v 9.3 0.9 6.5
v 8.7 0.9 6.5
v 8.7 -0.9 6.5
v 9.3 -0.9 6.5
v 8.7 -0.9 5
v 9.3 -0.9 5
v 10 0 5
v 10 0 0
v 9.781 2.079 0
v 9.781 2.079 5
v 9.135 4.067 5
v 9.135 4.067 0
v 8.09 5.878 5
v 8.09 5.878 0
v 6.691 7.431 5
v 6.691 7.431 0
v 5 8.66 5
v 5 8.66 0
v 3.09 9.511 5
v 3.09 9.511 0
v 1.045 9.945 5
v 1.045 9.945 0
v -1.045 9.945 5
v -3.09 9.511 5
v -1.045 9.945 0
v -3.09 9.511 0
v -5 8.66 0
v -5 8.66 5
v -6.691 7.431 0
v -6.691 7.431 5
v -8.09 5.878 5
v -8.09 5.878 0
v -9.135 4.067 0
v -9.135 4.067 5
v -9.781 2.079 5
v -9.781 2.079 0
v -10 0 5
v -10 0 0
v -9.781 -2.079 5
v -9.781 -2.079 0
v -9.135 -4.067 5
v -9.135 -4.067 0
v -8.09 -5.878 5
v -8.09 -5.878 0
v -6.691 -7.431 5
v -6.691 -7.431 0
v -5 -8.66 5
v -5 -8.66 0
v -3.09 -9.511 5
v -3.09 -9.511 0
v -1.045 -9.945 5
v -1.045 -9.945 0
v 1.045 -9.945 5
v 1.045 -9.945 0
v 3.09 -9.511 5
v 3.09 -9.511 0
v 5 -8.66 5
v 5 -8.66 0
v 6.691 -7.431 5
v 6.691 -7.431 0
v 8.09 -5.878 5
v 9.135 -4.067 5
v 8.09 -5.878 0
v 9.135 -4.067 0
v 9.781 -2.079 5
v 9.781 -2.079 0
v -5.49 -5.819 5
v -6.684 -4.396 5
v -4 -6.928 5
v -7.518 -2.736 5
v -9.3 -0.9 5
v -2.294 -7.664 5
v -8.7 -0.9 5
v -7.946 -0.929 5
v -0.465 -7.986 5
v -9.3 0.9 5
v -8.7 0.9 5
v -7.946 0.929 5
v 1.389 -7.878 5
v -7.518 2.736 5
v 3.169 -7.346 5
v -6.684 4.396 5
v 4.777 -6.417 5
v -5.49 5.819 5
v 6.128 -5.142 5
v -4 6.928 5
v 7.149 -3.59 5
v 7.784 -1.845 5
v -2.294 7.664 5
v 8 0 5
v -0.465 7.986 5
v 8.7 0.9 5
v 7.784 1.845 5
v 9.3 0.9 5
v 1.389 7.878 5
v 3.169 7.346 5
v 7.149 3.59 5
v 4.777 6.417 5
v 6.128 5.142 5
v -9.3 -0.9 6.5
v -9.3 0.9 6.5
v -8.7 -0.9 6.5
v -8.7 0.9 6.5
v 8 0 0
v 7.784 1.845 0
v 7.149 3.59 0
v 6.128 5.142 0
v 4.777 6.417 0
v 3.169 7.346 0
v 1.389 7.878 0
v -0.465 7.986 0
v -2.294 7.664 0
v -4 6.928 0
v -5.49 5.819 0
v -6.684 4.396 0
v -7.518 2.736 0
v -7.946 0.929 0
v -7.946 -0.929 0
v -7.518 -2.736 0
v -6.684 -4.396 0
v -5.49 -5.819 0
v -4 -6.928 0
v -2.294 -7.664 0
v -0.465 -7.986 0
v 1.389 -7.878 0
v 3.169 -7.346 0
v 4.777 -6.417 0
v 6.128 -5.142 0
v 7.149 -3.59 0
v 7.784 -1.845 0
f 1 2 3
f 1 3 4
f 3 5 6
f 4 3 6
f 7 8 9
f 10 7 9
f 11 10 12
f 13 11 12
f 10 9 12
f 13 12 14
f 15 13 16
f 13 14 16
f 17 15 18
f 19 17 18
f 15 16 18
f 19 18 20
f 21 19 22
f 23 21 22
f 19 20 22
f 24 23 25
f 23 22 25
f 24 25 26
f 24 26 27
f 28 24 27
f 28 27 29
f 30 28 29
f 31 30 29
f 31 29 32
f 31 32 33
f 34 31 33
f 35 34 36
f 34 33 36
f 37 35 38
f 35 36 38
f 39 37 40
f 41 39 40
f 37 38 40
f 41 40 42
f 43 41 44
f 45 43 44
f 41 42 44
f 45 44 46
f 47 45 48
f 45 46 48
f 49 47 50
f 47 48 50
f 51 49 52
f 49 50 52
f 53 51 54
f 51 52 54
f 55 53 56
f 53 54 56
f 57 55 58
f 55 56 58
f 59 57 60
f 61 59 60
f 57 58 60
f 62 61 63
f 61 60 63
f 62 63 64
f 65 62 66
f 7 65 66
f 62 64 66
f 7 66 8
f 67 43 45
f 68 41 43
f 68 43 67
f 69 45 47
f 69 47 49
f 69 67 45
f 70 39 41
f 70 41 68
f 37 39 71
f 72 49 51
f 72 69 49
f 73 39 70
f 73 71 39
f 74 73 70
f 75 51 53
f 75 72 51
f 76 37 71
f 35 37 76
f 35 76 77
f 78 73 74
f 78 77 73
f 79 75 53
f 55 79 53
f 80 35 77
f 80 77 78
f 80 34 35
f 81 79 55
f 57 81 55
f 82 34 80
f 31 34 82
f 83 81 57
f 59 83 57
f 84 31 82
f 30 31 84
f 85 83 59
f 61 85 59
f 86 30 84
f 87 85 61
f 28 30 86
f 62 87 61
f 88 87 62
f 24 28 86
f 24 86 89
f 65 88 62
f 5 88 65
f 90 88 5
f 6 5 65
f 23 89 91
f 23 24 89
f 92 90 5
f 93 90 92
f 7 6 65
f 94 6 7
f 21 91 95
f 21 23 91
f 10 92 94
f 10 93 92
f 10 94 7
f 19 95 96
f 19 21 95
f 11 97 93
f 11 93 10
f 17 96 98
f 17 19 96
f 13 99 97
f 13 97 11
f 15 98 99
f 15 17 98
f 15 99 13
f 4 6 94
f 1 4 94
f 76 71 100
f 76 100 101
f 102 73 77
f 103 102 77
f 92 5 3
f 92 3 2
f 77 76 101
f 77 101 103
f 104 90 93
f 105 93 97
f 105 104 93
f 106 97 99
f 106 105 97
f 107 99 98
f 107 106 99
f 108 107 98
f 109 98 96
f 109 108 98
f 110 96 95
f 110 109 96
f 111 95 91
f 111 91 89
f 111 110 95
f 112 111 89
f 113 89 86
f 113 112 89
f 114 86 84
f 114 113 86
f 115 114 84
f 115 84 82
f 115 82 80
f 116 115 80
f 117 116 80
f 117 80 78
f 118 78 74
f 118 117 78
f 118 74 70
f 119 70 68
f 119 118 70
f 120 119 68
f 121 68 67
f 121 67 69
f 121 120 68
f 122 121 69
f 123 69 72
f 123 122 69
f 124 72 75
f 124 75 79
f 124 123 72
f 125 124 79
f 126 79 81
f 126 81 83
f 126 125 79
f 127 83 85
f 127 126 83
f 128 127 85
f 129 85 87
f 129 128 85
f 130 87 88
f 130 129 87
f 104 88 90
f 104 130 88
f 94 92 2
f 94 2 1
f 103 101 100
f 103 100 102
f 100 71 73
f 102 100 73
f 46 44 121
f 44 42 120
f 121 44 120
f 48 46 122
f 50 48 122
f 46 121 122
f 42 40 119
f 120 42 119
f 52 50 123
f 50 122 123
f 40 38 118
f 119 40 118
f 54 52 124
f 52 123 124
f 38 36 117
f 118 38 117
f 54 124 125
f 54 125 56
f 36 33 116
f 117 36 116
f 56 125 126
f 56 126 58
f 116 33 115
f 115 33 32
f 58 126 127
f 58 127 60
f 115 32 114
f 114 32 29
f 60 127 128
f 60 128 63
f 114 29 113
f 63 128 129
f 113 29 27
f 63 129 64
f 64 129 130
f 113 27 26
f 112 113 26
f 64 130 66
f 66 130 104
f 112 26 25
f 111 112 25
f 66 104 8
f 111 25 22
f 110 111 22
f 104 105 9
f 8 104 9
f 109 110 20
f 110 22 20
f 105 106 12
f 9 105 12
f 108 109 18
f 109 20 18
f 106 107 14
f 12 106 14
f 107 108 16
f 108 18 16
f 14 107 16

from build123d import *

# Parameters (mm, degrees)
F0_W     = 0.6
F0_H     = 1.8
F1_DEPTH = 6.5
F0_R     = 10
F0_R_2   = 8
F2_DEPTH = 5


with BuildPart() as f1:
    # F0 (on Top) → F1 (new body)
    with BuildSketch(Plane.XY):
        with Locations((-9, 0)):
            Rectangle(F0_W, F0_H)
    extrude(amount=F1_DEPTH)



with BuildPart() as f1b:
    # F0 (on Top) → F1, piece 2 (new body)
    with BuildSketch(Plane.XY):
        with Locations((9, 0)):
            Rectangle(F0_W, F0_H)
    extrude(amount=F1_DEPTH)


with BuildPart() as f1_1:
    add(f1.part)

    add(f1b.part)  # F2 merges F1b
    # F0 (on Top) → F2 (join)
    with BuildSketch(Plane.XY):
        Circle(F0_R)
        with Locations((-9, 0)):
            Rectangle(F0_W, F0_H, mode=Mode.SUBTRACT)
        Circle(F0_R_2, mode=Mode.SUBTRACT)
        with Locations((9, 0)):
            Rectangle(F0_W, F0_H, mode=Mode.SUBTRACT)
    extrude(amount=F2_DEPTH)


solid = f1_1.part
